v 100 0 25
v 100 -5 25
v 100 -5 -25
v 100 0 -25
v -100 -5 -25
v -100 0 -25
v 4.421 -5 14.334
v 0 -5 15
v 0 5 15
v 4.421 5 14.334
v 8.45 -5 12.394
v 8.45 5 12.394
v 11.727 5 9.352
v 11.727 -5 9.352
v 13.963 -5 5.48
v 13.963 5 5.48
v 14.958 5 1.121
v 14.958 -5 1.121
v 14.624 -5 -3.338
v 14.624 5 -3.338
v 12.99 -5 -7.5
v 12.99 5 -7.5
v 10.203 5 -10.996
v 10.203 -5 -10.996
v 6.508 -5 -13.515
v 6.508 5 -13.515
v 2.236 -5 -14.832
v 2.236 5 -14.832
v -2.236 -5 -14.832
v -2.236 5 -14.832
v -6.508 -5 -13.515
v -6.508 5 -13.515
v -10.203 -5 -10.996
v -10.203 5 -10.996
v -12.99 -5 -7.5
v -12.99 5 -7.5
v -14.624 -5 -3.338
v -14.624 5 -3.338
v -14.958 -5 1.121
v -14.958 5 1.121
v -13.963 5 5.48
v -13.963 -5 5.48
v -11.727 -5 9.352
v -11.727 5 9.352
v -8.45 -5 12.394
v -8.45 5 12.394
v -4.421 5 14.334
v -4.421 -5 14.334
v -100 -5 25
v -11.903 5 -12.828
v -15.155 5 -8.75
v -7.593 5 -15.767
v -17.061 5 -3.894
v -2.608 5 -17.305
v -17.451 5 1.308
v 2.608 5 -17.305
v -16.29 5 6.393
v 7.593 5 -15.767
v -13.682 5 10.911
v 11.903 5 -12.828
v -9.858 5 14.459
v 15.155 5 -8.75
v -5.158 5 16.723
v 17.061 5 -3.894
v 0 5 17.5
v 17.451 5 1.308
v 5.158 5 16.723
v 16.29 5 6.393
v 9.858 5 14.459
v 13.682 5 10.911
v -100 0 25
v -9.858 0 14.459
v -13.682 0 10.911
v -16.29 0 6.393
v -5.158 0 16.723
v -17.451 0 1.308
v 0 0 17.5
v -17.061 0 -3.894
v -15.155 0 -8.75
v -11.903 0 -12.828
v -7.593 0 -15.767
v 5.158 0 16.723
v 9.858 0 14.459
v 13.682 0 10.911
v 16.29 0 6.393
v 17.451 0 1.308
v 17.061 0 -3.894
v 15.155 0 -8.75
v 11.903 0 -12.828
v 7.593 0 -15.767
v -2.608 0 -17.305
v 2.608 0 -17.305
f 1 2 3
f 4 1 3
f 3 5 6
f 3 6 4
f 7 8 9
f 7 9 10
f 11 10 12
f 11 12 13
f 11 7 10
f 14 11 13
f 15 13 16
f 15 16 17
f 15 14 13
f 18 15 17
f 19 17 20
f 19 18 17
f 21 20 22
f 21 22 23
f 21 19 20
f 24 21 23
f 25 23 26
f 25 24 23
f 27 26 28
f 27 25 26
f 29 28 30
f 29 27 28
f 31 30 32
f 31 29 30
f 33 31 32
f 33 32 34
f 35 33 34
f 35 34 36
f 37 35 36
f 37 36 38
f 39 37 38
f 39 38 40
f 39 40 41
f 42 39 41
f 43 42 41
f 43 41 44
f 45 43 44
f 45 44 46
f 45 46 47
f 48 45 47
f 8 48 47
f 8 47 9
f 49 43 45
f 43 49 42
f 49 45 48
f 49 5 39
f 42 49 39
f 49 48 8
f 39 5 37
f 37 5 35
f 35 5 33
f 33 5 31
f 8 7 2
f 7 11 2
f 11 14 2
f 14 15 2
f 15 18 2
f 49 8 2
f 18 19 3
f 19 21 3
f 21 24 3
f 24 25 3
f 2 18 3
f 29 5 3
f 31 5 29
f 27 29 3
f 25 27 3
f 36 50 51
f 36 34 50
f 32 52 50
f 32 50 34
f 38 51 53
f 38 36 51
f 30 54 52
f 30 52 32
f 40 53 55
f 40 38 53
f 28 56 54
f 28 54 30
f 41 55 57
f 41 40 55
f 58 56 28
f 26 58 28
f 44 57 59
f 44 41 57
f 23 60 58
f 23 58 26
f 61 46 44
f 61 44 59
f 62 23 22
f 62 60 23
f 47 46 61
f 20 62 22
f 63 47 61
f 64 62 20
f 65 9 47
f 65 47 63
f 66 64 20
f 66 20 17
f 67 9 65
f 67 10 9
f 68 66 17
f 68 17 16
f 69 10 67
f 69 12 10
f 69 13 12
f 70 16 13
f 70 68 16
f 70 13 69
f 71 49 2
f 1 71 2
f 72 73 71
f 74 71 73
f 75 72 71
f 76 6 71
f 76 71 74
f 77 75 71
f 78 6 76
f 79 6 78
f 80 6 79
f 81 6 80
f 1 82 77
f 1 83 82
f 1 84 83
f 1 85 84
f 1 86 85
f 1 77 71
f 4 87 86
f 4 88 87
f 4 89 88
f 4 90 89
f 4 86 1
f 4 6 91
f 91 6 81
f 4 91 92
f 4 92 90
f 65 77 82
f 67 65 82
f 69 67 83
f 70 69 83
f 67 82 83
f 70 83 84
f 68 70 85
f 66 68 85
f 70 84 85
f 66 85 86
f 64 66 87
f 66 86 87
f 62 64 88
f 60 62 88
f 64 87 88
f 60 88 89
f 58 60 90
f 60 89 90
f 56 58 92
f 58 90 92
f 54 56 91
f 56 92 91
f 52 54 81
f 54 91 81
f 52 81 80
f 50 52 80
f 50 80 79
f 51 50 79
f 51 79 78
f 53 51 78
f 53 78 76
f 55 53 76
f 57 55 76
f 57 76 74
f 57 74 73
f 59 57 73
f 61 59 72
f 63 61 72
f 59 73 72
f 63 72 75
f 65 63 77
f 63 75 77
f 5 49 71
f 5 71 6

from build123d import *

# Parameters (mm, degrees)
SKETCH1_R           = 17.5
SKETCH1_R_2         = 15
BOSS_EXTRUDE1_DEPTH = 5
BOSS_EXTRUDE2_START = -5
SKETCH1_3_W         = 200
SKETCH1_3_H         = 50
SKETCH1_3_R         = 15
BOSS_EXTRUDE2_DEPTH = 5


with BuildPart() as part:
    # Sketch1 → Boss-Extrude1 (new body)
    with BuildSketch(Plane(origin=(0, 0, 0), x_dir=(1, 0, 0), z_dir=(0, 1, 0))):
        Circle(SKETCH1_R)
        Circle(SKETCH1_R_2, mode=Mode.SUBTRACT)
    extrude(amount=BOSS_EXTRUDE1_DEPTH)

    # Sketch1<3> → Boss-Extrude2 (add)
    with BuildSketch(Plane(origin=(0, 0, 0), x_dir=(1, 0, 0), z_dir=(0, 1, 0)).offset(BOSS_EXTRUDE2_START)):
        Rectangle(SKETCH1_3_W, SKETCH1_3_H)
        Circle(SKETCH1_3_R, mode=Mode.SUBTRACT)
    extrude(amount=BOSS_EXTRUDE2_DEPTH)


solid = part.part
